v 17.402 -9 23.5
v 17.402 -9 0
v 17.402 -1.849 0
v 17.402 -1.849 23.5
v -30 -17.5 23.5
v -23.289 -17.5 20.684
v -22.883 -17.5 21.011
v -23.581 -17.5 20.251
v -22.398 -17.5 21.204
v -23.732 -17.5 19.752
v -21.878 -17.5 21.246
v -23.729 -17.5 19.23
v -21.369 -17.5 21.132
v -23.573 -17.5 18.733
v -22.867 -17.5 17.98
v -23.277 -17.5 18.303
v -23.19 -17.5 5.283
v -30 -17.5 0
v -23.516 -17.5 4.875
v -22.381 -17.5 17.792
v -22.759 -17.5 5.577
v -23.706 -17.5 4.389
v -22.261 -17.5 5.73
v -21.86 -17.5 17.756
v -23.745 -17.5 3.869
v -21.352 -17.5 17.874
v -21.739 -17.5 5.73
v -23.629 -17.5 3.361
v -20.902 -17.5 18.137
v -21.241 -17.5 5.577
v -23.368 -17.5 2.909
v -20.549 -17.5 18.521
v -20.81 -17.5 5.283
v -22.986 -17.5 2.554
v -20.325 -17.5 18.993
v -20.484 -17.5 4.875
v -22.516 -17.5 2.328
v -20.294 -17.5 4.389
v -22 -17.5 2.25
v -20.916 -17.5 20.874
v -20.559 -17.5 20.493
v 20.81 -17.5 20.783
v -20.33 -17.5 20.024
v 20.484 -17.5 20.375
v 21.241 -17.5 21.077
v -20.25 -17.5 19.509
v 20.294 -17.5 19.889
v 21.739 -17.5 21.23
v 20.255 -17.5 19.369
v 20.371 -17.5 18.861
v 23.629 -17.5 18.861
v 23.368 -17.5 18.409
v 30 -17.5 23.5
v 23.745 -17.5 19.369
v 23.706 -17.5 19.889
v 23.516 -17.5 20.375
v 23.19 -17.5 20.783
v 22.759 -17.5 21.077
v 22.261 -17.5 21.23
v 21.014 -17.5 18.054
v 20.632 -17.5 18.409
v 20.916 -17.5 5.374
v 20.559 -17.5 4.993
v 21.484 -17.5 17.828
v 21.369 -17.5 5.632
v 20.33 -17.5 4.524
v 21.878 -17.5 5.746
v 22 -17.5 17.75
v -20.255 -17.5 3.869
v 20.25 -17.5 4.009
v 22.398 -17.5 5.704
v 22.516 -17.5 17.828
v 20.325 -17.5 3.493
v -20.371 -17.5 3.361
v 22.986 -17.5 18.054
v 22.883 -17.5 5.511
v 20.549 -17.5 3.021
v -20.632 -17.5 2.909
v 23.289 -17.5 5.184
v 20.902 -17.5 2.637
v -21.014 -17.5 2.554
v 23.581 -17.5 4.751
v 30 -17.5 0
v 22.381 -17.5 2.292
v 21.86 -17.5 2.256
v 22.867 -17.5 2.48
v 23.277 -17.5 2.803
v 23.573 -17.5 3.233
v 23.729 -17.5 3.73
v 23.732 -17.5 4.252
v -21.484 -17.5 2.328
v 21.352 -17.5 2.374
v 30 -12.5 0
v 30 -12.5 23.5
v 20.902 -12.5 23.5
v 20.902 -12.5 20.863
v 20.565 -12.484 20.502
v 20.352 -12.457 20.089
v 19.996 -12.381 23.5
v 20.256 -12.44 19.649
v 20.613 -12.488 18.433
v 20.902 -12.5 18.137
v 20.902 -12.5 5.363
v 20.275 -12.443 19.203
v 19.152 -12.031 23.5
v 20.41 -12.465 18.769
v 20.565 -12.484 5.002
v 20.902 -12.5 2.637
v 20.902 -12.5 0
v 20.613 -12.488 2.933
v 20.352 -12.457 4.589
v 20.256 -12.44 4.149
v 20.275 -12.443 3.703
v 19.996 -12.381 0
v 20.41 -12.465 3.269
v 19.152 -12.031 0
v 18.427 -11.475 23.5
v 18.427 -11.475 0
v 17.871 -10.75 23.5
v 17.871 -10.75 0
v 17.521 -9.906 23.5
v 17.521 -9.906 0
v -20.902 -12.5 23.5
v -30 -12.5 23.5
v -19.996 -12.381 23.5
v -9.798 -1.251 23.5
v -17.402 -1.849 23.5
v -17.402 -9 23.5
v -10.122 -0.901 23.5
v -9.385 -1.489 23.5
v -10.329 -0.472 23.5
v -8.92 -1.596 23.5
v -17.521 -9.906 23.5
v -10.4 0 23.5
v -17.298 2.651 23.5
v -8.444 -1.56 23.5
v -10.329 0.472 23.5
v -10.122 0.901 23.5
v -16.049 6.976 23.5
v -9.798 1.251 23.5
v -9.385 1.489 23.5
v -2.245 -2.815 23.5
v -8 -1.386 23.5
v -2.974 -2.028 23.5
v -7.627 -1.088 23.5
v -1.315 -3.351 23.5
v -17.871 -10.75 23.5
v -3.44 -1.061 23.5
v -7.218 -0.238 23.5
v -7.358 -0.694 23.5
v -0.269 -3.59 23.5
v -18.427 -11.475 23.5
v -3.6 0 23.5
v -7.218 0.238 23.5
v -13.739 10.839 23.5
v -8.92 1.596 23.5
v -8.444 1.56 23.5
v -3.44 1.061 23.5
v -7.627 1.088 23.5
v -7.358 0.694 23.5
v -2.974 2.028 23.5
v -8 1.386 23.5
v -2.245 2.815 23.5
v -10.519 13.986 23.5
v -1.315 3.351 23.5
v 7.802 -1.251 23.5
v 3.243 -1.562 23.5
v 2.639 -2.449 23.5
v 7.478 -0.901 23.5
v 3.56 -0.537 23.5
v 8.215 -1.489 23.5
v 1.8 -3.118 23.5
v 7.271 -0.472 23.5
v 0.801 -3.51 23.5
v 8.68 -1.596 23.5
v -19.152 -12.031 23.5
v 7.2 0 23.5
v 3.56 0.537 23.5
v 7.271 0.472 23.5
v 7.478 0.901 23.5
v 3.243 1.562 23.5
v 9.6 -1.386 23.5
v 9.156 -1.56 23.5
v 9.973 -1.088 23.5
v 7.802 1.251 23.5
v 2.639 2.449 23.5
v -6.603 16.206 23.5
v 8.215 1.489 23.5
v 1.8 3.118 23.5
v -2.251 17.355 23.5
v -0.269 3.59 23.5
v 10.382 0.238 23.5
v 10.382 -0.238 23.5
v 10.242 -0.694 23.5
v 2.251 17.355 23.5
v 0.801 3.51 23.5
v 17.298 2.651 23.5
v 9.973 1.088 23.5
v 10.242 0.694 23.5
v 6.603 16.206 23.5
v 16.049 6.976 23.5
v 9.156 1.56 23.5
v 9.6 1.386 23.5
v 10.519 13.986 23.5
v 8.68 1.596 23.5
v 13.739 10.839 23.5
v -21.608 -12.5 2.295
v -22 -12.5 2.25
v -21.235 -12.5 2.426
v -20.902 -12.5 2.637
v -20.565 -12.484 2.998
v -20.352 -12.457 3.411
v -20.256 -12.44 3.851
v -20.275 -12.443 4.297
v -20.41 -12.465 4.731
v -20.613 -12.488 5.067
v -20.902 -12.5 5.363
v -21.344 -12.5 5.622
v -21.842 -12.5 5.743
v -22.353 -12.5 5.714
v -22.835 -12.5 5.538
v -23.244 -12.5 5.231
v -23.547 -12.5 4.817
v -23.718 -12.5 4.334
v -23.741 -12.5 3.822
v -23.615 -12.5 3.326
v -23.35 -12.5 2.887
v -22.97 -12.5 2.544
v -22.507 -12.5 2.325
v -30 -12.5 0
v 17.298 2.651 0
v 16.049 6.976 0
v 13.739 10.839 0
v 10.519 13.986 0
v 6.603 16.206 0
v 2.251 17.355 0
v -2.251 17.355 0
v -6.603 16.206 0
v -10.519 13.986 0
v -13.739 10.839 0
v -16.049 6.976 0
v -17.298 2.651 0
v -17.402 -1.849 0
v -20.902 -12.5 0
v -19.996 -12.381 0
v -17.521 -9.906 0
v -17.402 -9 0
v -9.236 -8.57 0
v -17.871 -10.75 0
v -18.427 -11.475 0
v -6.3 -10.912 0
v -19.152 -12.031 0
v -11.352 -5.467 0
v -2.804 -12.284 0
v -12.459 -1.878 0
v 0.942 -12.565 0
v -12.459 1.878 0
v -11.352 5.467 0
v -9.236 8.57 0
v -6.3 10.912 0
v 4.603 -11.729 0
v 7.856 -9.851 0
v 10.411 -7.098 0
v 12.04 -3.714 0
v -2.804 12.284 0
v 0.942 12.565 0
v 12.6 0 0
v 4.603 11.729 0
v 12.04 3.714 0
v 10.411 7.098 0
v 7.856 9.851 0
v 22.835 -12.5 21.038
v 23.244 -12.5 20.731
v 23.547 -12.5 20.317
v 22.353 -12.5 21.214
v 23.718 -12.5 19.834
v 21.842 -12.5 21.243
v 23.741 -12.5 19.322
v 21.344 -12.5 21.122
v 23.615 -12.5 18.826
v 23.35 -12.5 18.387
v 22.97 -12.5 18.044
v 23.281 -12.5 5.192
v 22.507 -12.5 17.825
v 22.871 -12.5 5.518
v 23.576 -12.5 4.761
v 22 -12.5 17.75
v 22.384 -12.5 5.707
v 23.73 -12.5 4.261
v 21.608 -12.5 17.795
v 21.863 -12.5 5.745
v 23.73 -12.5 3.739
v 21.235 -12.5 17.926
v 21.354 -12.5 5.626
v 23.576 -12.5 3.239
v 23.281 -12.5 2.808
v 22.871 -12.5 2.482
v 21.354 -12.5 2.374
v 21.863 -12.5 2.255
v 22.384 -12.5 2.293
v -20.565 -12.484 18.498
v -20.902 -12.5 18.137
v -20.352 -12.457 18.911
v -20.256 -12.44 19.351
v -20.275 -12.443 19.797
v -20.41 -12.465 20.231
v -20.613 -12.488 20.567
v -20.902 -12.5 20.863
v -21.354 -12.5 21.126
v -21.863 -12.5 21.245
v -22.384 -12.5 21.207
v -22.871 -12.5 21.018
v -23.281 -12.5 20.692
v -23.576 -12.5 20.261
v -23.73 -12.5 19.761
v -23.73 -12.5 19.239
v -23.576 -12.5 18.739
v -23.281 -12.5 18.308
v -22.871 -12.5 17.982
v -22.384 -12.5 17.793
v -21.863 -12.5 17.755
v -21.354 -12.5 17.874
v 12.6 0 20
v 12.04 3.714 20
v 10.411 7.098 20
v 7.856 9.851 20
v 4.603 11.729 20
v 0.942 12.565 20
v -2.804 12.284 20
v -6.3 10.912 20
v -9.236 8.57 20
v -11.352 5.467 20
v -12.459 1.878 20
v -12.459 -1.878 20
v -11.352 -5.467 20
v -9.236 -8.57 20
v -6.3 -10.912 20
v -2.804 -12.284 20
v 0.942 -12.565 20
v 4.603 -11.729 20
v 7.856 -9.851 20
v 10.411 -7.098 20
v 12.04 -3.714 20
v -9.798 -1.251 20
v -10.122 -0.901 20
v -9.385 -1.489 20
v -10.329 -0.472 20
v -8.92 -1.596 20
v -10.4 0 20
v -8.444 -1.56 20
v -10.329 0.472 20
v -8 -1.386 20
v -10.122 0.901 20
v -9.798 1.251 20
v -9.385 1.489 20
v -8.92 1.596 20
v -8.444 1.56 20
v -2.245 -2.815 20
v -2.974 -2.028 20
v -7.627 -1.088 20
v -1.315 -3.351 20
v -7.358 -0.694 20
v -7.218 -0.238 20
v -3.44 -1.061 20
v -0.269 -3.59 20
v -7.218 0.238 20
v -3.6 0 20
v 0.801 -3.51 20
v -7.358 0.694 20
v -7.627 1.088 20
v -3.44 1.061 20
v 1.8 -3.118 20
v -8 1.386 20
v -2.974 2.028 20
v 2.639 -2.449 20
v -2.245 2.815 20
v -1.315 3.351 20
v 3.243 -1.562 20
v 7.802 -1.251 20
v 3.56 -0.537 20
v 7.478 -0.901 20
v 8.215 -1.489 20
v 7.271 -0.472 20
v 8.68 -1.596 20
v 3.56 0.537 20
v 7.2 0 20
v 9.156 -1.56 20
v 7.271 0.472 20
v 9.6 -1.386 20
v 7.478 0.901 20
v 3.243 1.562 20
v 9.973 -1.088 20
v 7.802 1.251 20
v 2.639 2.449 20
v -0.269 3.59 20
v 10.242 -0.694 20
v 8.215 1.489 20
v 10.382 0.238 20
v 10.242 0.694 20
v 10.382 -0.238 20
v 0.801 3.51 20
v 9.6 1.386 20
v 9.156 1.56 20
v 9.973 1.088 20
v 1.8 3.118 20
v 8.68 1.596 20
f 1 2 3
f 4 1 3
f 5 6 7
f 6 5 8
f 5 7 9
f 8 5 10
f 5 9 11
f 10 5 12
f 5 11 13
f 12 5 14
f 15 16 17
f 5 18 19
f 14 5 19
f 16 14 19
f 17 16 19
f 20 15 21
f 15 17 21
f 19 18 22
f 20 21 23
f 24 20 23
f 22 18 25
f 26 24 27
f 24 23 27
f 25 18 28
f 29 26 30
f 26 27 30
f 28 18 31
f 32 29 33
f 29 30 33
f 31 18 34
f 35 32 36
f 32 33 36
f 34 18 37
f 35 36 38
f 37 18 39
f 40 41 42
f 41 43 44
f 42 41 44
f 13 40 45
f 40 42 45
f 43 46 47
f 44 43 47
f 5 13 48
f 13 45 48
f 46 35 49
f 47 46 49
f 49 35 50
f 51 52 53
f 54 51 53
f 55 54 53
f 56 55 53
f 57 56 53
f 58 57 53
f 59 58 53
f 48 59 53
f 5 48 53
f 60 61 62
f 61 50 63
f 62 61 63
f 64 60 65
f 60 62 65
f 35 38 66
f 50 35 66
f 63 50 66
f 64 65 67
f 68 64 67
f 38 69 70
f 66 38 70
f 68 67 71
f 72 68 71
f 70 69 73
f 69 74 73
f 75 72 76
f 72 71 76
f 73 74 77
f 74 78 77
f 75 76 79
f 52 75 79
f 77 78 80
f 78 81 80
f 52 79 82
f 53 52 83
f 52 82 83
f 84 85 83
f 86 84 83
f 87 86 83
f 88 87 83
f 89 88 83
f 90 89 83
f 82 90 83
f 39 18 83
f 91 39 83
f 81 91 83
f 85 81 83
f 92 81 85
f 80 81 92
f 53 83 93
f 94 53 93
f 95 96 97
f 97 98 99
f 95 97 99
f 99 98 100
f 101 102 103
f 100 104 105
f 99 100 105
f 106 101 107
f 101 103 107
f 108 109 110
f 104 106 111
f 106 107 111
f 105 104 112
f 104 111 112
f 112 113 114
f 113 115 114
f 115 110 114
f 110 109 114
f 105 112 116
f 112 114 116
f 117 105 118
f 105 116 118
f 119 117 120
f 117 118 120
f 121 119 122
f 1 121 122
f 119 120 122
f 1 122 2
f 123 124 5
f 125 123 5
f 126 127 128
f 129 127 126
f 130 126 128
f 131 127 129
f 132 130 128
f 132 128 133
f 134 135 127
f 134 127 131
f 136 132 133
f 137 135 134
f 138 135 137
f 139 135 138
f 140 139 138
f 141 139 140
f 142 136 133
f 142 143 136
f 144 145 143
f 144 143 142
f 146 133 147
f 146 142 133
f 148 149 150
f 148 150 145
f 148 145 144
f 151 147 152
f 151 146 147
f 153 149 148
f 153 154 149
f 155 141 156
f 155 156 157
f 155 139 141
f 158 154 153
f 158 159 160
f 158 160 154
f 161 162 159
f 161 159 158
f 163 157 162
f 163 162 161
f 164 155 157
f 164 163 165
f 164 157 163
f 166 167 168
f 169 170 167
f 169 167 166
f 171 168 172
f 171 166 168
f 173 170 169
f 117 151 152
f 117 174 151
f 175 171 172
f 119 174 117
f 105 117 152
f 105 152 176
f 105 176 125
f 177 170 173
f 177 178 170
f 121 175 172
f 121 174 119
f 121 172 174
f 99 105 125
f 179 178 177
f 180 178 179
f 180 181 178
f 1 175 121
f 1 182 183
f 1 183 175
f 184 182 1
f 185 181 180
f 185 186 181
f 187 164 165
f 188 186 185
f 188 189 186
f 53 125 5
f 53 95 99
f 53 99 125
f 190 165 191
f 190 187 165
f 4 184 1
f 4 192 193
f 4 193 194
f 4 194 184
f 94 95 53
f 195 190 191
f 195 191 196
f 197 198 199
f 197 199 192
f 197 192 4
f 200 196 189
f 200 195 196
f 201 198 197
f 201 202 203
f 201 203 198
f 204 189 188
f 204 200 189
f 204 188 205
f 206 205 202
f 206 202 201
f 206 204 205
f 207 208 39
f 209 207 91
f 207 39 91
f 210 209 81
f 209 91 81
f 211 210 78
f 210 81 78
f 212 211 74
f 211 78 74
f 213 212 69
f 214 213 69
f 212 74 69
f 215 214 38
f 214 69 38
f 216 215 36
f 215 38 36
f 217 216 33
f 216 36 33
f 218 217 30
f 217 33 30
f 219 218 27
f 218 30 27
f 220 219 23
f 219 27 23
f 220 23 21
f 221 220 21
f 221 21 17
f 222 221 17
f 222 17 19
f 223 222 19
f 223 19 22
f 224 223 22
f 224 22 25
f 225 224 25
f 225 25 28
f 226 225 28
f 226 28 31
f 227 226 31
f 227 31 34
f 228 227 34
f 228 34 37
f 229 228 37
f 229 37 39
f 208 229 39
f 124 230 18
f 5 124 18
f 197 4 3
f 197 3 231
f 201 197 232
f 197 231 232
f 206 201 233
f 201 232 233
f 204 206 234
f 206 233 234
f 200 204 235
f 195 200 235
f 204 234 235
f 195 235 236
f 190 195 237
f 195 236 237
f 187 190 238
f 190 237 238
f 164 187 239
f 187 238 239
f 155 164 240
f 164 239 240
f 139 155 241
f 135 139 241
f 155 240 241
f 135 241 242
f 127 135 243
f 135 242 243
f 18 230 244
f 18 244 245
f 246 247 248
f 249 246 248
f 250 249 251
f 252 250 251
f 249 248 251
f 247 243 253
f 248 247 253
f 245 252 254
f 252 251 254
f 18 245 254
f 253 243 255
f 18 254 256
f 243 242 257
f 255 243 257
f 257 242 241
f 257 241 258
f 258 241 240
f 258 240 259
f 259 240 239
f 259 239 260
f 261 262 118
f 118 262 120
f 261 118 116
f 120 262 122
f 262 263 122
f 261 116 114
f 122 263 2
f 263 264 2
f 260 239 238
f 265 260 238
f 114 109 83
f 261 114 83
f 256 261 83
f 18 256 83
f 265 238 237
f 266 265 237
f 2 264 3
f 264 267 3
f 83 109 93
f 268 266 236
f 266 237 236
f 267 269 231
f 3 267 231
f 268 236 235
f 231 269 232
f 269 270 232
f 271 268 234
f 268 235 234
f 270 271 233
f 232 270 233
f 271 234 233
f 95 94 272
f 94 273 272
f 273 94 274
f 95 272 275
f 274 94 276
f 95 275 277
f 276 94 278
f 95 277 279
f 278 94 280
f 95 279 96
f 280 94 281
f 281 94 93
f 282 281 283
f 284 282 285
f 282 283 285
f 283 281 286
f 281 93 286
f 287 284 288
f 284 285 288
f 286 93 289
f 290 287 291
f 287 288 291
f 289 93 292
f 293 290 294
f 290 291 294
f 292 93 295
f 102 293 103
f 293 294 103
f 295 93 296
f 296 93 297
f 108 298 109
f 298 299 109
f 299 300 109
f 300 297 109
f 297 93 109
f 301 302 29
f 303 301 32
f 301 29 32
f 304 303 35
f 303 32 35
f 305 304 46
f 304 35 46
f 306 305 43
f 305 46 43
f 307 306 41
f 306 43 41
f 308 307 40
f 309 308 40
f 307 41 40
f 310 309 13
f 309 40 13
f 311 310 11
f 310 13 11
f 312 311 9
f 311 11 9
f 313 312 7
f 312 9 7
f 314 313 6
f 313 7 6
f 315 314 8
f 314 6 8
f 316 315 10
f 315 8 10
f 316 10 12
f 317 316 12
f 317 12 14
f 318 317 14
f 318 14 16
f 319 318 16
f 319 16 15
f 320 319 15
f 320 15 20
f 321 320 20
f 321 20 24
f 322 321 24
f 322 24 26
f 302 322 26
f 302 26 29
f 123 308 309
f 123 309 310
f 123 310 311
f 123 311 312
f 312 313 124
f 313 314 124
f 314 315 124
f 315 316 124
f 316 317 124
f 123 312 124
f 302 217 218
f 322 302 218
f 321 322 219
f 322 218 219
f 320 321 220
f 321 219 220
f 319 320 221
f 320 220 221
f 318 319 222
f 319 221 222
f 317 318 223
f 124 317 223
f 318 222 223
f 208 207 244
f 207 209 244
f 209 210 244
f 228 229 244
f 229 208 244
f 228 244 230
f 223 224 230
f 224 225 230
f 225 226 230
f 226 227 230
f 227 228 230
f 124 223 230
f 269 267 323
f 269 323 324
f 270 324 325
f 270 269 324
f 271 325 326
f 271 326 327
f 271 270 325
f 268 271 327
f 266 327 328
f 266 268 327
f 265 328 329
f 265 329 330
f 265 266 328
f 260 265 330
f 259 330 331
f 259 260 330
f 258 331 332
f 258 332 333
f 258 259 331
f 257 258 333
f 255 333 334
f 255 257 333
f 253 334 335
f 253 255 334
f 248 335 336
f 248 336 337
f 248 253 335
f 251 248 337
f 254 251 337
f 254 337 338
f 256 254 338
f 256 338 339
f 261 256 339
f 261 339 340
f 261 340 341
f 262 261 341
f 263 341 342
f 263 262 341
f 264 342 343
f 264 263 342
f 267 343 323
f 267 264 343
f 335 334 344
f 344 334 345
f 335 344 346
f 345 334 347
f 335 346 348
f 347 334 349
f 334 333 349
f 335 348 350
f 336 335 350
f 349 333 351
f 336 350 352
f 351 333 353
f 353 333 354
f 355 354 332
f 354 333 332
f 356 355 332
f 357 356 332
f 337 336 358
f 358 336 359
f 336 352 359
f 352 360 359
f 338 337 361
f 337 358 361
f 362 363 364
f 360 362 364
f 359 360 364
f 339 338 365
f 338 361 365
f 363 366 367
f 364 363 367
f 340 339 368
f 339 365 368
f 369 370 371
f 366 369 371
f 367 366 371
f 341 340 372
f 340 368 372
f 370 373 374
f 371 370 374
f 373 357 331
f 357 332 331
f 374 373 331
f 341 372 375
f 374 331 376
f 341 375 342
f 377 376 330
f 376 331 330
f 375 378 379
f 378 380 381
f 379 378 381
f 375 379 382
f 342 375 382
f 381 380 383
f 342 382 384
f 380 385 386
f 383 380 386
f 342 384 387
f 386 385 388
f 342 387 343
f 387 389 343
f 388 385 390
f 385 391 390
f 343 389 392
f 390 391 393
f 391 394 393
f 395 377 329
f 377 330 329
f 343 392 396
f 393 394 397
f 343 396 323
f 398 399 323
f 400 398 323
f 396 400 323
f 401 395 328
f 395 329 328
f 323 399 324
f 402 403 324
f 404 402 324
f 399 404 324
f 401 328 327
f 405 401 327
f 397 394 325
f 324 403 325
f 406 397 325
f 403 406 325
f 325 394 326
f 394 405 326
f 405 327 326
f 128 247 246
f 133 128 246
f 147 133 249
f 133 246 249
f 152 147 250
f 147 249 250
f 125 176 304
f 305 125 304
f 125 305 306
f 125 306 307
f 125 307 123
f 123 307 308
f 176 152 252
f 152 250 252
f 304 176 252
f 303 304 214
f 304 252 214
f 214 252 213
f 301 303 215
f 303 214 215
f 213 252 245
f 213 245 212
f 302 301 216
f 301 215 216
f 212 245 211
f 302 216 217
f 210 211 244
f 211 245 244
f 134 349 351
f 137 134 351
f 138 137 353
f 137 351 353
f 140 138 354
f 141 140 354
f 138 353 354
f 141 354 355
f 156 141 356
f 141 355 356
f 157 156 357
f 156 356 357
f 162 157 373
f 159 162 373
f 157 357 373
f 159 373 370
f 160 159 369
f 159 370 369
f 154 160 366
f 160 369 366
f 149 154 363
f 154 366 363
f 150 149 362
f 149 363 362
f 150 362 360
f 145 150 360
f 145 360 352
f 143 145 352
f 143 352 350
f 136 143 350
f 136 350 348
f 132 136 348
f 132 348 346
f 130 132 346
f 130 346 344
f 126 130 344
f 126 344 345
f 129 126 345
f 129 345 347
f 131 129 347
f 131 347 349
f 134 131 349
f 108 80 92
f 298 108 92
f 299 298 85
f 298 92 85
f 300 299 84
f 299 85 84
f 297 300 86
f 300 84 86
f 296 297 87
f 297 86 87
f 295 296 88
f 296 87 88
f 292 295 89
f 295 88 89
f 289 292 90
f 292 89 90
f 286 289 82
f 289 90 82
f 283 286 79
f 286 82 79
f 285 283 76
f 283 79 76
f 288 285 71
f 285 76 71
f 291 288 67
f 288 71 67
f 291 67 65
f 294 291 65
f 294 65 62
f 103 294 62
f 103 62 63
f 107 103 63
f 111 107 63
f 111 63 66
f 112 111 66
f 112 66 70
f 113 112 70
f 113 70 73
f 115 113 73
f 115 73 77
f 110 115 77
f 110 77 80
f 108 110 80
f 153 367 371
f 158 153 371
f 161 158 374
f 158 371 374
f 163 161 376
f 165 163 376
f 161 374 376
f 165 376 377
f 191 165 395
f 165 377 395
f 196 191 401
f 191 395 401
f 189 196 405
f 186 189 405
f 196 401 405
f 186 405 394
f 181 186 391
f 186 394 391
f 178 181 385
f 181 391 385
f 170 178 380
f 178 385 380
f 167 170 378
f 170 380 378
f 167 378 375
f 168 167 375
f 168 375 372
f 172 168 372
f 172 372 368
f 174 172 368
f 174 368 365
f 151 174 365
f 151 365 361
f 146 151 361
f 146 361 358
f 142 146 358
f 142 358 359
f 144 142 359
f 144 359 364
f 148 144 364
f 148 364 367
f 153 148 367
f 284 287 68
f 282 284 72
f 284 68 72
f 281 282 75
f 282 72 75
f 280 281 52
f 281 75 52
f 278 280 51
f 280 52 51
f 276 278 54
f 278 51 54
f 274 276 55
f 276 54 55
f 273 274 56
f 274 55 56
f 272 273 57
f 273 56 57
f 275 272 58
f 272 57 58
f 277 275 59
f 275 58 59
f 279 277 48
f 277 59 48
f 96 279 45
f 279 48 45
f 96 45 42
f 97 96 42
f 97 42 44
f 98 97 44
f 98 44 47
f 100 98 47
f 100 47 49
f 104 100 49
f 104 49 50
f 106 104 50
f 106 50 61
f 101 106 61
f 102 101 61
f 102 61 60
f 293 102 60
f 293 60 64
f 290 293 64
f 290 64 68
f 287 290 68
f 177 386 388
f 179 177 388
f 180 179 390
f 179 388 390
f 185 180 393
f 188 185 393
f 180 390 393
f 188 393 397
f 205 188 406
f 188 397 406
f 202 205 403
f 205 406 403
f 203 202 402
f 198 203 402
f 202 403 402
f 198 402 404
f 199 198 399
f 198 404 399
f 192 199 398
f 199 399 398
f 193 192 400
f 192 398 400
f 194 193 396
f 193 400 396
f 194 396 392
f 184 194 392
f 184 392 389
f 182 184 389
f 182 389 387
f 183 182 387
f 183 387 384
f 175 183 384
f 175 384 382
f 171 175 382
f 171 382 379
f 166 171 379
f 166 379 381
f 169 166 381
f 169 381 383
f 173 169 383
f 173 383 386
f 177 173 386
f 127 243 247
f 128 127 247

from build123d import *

# Parameters (mm, degrees)
SZKIC1_R                    = 17.5
SZKIC1_R_2                  = 12.6
DODANIE_WYCI_GNI_CIE1_DEPTH = 20
SZKIC2_R                    = 17.5
DODANIE_WYCI_GNI_CIE2_DEPTH = 3.5
DODANIE_WYCI_GNI_CIE3_START = -23.5
DODANIE_WYCI_GNI_CIE3_DEPTH = 23.5
SZKIC4_R                    = 3.6
SZKIC4_R_2                  = 1.6
WYTNIJ_WYCI_GNI_CIE1_DEPTH  = 41.078048855
SZKIC5_R                    = 1.75
WYTNIJ_WYCI_GNI_CIE2_DEPTH  = 52.742149163


with BuildPart() as part:
    # Szkic1 → Dodanie-wyciągnięcie1 (new body)
    with BuildSketch(Plane.XY):
        Circle(SZKIC1_R)
        Circle(SZKIC1_R_2, mode=Mode.SUBTRACT)
    extrude(amount=DODANIE_WYCI_GNI_CIE1_DEPTH)

    # Szkic2 → Dodanie-wyciągnięcie2 (add)
    with BuildSketch(Plane.XY.offset(20)):
        Circle(SZKIC2_R)
    extrude(amount=DODANIE_WYCI_GNI_CIE2_DEPTH)

    # Szkic3 → Dodanie-wyciągnięcie3 (add)
    with BuildSketch(Plane.XY.offset(23.5).offset(DODANIE_WYCI_GNI_CIE3_START)):
        with BuildLine():
            Line((-30, -12.5), (-30, -17.5))
            Line((-30, -17.5), (3e-09, -17.5))
            ThreePointArc((3e-09, -17.5), (-11.702275118, -13.011793), (-17.40200931, -1.849343661))
            Line((-17.40200931, -1.849343661), (-17.40200931, -9))
            ThreePointArc((-17.40200931, -9), (-18.427135576, -11.474873734), (-20.90200931, -12.5))
            Line((-20.90200931, -12.5), (-30, -12.5))
        make_face()
        with BuildLine():
            ThreePointArc((17.40200931, -1.849343661), (11.70227512, -13.011792998), (3e-09, -17.5))
            Line((3e-09, -17.5), (30, -17.5))
            Line((30, -17.5), (30, -12.5))
            Line((30, -12.5), (20.90200931, -12.5))
            ThreePointArc((20.90200931, -12.5), (18.427135576, -11.474873734), (17.40200931, -9))
            Line((17.40200931, -9), (17.40200931, -1.849343661))
        make_face()
    extrude(amount=DODANIE_WYCI_GNI_CIE3_DEPTH)

    # Szkic4 → Wytnij-wyciągnięcie1 (cut, through all)
    with BuildSketch(Plane(origin=(0, 0, 20), x_dir=(-1, 0, 0), z_dir=(0, 0, -1))):
        Circle(SZKIC4_R)
        with Locations((-8.8, 0)):
            Circle(SZKIC4_R_2)
        with Locations((8.8, 0)):
            Circle(SZKIC4_R_2)
    extrude(amount=-WYTNIJ_WYCI_GNI_CIE1_DEPTH, mode=Mode.SUBTRACT)

    # Szkic5 → Wytnij-wyciągnięcie2 (cut, through all)
    with BuildSketch(Plane.XZ.offset(17.5)):
        with Locations(Location((-22, 4, 0), (0, 0, 270))):
            Circle(SZKIC5_R)
        with Locations(Location((22, 4, 0), (0, 0, 231.139730474))):
            Circle(SZKIC5_R)
        with Locations(Location((22, 19.5, 0), (0, 0, 270))):
            Circle(SZKIC5_R)
        with Locations(Location((-22, 19.5, 0), (0, 0, 308.860269529))):
            Circle(SZKIC5_R)
    extrude(amount=-WYTNIJ_WYCI_GNI_CIE2_DEPTH, mode=Mode.SUBTRACT)


solid = part.part
